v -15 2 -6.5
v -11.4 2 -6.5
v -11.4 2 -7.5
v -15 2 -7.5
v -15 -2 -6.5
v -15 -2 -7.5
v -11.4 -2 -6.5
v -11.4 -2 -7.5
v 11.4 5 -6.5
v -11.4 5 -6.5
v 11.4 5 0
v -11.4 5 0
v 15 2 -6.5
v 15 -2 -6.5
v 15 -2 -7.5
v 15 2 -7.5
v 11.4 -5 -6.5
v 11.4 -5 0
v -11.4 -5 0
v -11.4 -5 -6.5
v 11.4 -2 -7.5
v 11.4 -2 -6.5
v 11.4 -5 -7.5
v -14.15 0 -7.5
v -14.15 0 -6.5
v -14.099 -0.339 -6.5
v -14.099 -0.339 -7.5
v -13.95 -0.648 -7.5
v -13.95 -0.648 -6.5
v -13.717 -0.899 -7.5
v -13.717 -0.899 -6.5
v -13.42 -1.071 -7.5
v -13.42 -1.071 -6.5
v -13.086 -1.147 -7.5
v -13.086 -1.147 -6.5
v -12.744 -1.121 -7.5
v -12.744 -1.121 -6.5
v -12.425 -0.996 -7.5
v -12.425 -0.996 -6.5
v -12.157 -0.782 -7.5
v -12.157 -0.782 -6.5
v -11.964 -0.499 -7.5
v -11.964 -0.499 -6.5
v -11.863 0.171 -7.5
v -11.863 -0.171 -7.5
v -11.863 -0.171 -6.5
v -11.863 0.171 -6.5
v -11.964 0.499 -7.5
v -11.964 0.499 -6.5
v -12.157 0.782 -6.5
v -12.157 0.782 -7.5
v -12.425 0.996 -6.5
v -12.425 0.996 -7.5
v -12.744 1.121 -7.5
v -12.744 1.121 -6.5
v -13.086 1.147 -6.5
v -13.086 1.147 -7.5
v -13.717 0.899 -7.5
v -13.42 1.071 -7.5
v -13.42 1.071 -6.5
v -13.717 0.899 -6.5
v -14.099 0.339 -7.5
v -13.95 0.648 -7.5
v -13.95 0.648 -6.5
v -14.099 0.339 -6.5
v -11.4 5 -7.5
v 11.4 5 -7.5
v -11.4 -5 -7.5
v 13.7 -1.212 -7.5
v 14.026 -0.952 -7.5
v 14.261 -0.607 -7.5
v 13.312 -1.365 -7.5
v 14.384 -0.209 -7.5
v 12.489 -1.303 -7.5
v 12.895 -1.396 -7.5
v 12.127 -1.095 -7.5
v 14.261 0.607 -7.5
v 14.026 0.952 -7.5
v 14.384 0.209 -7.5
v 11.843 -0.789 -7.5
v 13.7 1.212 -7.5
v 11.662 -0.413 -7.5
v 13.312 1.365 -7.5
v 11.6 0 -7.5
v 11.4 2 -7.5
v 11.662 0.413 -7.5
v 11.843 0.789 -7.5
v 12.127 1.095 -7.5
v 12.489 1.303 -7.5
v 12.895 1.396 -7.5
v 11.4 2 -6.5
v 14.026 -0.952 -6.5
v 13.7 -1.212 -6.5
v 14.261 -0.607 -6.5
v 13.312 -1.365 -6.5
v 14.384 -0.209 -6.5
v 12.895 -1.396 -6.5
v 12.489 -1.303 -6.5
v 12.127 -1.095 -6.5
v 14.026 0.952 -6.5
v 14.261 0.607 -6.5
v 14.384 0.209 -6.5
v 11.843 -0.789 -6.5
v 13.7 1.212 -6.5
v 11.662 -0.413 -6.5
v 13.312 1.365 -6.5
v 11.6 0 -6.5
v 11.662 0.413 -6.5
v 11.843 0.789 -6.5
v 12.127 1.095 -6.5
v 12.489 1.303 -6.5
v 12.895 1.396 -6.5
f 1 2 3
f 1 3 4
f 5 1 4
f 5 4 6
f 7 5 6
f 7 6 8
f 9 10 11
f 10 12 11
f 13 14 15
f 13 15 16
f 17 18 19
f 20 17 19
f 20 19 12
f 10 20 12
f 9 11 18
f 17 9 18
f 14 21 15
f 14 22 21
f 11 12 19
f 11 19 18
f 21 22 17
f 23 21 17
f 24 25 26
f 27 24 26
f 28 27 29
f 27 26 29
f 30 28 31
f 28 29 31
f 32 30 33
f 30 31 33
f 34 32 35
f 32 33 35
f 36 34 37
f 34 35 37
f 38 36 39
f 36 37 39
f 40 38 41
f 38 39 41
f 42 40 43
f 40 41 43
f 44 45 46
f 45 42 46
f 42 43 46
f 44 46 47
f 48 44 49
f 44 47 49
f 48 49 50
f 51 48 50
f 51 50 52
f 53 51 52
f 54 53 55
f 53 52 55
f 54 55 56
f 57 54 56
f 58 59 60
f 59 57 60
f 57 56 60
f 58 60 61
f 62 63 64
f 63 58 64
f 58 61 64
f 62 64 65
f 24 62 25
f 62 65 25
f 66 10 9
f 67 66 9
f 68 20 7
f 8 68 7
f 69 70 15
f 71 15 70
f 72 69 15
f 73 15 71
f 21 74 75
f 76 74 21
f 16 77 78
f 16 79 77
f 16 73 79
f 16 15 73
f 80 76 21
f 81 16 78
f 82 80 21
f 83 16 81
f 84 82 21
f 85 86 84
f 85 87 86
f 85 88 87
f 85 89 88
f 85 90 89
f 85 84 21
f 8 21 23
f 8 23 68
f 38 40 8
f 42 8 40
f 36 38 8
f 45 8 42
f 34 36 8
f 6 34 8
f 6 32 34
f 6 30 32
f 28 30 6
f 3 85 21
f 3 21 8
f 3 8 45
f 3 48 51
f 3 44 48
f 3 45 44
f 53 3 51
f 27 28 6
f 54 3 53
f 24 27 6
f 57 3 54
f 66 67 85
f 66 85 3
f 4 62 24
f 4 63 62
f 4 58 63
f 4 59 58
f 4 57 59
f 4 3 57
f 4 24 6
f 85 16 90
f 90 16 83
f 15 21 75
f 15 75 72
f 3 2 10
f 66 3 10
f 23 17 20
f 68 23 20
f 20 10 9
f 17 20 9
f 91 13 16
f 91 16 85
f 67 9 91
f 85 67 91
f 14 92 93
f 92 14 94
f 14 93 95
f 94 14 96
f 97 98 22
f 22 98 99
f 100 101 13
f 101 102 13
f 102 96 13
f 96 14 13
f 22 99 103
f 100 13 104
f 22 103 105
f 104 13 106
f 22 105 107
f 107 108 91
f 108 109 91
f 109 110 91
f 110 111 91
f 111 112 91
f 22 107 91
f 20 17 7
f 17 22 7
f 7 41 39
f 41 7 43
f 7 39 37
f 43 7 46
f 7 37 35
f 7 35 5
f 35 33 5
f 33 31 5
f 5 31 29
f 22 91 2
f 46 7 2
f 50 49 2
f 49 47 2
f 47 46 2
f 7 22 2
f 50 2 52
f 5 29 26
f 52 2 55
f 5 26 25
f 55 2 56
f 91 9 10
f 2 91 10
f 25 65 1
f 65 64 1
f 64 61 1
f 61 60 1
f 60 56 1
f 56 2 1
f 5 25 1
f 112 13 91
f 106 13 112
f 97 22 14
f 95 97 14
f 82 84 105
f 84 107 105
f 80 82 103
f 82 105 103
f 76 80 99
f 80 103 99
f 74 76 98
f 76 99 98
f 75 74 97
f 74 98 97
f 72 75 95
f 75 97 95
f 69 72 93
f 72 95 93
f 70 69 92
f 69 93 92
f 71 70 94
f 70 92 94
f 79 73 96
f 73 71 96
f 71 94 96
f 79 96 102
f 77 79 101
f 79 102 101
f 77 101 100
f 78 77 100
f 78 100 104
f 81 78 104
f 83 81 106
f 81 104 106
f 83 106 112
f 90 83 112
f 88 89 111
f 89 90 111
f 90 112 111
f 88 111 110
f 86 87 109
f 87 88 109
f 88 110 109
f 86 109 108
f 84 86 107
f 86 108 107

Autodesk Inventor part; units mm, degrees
ref_plane "YZ Plane" through (0, 0, 0) normal (1, 0, 0) x (0, 1, 0)
ref_plane "XZ Plane" through (0, 0, 0) normal (0, 1, 0) x (-1, 0, 0)
ref_plane "XY Plane" through (0, 0, 0) normal (0, 0, 1) x (1, 0, 0)
sketch "Skizze1" plane through (0, 0, 0) normal (0, 0, 1) x (1, 0, 0)
  line L0 (-15.96, 0) -> (15.96, 0) construction
  line L1 (0, -7.0079) -> (0, 7.0013) construction
  line L2 (-11.4, 5) -> (11.4, 5)
  line L3 (11.4, 5) -> (11.4, -5)
  line L4 (11.4, -5) -> (-11.4, -5)
  line L5 (-11.4, -5) -> (-11.4, 5)
  point P0 (0, 0)
  dimension "d0" = 22.8
  dimension "d1" = 10
extrude "Extrusion1" add sketch "Skizze1" against normal blind 6.5
sketch "Skizze2" plane through (0, 0, -6.5) normal (0, 0, -1) x (-1, 0, 0)
  line L0 (-11.4, -5) -> (11.4, -5) construction
  line L1 (-11.4, 5) -> (-11.4, -5) construction
  line L2 (11.4, 5) -> (-11.4, 5) construction
  line L3 (11.4, -5) -> (11.4, 5) construction
  line L4 (21, 0) -> (-21, 0) construction
  line L5 (0, -7.0079) -> (0, 7.0013) construction
  line L6 (-11.4, -5) -> (11.4, -5)
  line L7 (11.4, 5) -> (-11.4, 5)
  line L8 (-11.4, -2) -> (-15, -2)
  line L9 (-15, -2) -> (-15, 2)
  line L10 (-15, 2) -> (-11.4, 2)
  line L11 (11.4, 2) -> (15, 2)
  line L12 (15, 2) -> (15, -2)
  line L13 (15, -2) -> (11.4, -2)
  circle A0 centre (-13, 0) radius 1.4
  circle A1 centre (13, 0) radius 1.15
  line L14 (-11.4, 5) -> (-11.4, 2)
  line L15 (-11.4, -2) -> (-11.4, -5)
  line L16 (11.4, -5) -> (11.4, -2)
  line L17 (11.4, 2) -> (11.4, 5)
  point P0 (0, 0)
  dimension "d4" = 4
  dimension "d6" = 30
  dimension "d7" = 2.8
  dimension "d8" = 2.3
  dimension "d9" = 26
extrude "Extrusion2" add sketch "Skizze2" along normal blind 1 separate body
sketch "Skizze3" plane through (0, 0, 0) normal (0, 0, 1) x (1, 0, 0)
  line L0 (-8.9441, 4.2214) -> (8.9948, 4.2214) construction
  line L1 (8.9948, 4.2214) -> (8.9948, -4.2459) construction
  line L2 (8.9948, -4.2459) -> (-8.9441, -4.2459) construction
  line L3 (-8.9441, -4.2459) -> (-8.9441, 4.2214) construction
  point P0 (0, 0)
decal "Aufkleber1"
properties part number "LED DC Digital Voltmeter 5V Display"
